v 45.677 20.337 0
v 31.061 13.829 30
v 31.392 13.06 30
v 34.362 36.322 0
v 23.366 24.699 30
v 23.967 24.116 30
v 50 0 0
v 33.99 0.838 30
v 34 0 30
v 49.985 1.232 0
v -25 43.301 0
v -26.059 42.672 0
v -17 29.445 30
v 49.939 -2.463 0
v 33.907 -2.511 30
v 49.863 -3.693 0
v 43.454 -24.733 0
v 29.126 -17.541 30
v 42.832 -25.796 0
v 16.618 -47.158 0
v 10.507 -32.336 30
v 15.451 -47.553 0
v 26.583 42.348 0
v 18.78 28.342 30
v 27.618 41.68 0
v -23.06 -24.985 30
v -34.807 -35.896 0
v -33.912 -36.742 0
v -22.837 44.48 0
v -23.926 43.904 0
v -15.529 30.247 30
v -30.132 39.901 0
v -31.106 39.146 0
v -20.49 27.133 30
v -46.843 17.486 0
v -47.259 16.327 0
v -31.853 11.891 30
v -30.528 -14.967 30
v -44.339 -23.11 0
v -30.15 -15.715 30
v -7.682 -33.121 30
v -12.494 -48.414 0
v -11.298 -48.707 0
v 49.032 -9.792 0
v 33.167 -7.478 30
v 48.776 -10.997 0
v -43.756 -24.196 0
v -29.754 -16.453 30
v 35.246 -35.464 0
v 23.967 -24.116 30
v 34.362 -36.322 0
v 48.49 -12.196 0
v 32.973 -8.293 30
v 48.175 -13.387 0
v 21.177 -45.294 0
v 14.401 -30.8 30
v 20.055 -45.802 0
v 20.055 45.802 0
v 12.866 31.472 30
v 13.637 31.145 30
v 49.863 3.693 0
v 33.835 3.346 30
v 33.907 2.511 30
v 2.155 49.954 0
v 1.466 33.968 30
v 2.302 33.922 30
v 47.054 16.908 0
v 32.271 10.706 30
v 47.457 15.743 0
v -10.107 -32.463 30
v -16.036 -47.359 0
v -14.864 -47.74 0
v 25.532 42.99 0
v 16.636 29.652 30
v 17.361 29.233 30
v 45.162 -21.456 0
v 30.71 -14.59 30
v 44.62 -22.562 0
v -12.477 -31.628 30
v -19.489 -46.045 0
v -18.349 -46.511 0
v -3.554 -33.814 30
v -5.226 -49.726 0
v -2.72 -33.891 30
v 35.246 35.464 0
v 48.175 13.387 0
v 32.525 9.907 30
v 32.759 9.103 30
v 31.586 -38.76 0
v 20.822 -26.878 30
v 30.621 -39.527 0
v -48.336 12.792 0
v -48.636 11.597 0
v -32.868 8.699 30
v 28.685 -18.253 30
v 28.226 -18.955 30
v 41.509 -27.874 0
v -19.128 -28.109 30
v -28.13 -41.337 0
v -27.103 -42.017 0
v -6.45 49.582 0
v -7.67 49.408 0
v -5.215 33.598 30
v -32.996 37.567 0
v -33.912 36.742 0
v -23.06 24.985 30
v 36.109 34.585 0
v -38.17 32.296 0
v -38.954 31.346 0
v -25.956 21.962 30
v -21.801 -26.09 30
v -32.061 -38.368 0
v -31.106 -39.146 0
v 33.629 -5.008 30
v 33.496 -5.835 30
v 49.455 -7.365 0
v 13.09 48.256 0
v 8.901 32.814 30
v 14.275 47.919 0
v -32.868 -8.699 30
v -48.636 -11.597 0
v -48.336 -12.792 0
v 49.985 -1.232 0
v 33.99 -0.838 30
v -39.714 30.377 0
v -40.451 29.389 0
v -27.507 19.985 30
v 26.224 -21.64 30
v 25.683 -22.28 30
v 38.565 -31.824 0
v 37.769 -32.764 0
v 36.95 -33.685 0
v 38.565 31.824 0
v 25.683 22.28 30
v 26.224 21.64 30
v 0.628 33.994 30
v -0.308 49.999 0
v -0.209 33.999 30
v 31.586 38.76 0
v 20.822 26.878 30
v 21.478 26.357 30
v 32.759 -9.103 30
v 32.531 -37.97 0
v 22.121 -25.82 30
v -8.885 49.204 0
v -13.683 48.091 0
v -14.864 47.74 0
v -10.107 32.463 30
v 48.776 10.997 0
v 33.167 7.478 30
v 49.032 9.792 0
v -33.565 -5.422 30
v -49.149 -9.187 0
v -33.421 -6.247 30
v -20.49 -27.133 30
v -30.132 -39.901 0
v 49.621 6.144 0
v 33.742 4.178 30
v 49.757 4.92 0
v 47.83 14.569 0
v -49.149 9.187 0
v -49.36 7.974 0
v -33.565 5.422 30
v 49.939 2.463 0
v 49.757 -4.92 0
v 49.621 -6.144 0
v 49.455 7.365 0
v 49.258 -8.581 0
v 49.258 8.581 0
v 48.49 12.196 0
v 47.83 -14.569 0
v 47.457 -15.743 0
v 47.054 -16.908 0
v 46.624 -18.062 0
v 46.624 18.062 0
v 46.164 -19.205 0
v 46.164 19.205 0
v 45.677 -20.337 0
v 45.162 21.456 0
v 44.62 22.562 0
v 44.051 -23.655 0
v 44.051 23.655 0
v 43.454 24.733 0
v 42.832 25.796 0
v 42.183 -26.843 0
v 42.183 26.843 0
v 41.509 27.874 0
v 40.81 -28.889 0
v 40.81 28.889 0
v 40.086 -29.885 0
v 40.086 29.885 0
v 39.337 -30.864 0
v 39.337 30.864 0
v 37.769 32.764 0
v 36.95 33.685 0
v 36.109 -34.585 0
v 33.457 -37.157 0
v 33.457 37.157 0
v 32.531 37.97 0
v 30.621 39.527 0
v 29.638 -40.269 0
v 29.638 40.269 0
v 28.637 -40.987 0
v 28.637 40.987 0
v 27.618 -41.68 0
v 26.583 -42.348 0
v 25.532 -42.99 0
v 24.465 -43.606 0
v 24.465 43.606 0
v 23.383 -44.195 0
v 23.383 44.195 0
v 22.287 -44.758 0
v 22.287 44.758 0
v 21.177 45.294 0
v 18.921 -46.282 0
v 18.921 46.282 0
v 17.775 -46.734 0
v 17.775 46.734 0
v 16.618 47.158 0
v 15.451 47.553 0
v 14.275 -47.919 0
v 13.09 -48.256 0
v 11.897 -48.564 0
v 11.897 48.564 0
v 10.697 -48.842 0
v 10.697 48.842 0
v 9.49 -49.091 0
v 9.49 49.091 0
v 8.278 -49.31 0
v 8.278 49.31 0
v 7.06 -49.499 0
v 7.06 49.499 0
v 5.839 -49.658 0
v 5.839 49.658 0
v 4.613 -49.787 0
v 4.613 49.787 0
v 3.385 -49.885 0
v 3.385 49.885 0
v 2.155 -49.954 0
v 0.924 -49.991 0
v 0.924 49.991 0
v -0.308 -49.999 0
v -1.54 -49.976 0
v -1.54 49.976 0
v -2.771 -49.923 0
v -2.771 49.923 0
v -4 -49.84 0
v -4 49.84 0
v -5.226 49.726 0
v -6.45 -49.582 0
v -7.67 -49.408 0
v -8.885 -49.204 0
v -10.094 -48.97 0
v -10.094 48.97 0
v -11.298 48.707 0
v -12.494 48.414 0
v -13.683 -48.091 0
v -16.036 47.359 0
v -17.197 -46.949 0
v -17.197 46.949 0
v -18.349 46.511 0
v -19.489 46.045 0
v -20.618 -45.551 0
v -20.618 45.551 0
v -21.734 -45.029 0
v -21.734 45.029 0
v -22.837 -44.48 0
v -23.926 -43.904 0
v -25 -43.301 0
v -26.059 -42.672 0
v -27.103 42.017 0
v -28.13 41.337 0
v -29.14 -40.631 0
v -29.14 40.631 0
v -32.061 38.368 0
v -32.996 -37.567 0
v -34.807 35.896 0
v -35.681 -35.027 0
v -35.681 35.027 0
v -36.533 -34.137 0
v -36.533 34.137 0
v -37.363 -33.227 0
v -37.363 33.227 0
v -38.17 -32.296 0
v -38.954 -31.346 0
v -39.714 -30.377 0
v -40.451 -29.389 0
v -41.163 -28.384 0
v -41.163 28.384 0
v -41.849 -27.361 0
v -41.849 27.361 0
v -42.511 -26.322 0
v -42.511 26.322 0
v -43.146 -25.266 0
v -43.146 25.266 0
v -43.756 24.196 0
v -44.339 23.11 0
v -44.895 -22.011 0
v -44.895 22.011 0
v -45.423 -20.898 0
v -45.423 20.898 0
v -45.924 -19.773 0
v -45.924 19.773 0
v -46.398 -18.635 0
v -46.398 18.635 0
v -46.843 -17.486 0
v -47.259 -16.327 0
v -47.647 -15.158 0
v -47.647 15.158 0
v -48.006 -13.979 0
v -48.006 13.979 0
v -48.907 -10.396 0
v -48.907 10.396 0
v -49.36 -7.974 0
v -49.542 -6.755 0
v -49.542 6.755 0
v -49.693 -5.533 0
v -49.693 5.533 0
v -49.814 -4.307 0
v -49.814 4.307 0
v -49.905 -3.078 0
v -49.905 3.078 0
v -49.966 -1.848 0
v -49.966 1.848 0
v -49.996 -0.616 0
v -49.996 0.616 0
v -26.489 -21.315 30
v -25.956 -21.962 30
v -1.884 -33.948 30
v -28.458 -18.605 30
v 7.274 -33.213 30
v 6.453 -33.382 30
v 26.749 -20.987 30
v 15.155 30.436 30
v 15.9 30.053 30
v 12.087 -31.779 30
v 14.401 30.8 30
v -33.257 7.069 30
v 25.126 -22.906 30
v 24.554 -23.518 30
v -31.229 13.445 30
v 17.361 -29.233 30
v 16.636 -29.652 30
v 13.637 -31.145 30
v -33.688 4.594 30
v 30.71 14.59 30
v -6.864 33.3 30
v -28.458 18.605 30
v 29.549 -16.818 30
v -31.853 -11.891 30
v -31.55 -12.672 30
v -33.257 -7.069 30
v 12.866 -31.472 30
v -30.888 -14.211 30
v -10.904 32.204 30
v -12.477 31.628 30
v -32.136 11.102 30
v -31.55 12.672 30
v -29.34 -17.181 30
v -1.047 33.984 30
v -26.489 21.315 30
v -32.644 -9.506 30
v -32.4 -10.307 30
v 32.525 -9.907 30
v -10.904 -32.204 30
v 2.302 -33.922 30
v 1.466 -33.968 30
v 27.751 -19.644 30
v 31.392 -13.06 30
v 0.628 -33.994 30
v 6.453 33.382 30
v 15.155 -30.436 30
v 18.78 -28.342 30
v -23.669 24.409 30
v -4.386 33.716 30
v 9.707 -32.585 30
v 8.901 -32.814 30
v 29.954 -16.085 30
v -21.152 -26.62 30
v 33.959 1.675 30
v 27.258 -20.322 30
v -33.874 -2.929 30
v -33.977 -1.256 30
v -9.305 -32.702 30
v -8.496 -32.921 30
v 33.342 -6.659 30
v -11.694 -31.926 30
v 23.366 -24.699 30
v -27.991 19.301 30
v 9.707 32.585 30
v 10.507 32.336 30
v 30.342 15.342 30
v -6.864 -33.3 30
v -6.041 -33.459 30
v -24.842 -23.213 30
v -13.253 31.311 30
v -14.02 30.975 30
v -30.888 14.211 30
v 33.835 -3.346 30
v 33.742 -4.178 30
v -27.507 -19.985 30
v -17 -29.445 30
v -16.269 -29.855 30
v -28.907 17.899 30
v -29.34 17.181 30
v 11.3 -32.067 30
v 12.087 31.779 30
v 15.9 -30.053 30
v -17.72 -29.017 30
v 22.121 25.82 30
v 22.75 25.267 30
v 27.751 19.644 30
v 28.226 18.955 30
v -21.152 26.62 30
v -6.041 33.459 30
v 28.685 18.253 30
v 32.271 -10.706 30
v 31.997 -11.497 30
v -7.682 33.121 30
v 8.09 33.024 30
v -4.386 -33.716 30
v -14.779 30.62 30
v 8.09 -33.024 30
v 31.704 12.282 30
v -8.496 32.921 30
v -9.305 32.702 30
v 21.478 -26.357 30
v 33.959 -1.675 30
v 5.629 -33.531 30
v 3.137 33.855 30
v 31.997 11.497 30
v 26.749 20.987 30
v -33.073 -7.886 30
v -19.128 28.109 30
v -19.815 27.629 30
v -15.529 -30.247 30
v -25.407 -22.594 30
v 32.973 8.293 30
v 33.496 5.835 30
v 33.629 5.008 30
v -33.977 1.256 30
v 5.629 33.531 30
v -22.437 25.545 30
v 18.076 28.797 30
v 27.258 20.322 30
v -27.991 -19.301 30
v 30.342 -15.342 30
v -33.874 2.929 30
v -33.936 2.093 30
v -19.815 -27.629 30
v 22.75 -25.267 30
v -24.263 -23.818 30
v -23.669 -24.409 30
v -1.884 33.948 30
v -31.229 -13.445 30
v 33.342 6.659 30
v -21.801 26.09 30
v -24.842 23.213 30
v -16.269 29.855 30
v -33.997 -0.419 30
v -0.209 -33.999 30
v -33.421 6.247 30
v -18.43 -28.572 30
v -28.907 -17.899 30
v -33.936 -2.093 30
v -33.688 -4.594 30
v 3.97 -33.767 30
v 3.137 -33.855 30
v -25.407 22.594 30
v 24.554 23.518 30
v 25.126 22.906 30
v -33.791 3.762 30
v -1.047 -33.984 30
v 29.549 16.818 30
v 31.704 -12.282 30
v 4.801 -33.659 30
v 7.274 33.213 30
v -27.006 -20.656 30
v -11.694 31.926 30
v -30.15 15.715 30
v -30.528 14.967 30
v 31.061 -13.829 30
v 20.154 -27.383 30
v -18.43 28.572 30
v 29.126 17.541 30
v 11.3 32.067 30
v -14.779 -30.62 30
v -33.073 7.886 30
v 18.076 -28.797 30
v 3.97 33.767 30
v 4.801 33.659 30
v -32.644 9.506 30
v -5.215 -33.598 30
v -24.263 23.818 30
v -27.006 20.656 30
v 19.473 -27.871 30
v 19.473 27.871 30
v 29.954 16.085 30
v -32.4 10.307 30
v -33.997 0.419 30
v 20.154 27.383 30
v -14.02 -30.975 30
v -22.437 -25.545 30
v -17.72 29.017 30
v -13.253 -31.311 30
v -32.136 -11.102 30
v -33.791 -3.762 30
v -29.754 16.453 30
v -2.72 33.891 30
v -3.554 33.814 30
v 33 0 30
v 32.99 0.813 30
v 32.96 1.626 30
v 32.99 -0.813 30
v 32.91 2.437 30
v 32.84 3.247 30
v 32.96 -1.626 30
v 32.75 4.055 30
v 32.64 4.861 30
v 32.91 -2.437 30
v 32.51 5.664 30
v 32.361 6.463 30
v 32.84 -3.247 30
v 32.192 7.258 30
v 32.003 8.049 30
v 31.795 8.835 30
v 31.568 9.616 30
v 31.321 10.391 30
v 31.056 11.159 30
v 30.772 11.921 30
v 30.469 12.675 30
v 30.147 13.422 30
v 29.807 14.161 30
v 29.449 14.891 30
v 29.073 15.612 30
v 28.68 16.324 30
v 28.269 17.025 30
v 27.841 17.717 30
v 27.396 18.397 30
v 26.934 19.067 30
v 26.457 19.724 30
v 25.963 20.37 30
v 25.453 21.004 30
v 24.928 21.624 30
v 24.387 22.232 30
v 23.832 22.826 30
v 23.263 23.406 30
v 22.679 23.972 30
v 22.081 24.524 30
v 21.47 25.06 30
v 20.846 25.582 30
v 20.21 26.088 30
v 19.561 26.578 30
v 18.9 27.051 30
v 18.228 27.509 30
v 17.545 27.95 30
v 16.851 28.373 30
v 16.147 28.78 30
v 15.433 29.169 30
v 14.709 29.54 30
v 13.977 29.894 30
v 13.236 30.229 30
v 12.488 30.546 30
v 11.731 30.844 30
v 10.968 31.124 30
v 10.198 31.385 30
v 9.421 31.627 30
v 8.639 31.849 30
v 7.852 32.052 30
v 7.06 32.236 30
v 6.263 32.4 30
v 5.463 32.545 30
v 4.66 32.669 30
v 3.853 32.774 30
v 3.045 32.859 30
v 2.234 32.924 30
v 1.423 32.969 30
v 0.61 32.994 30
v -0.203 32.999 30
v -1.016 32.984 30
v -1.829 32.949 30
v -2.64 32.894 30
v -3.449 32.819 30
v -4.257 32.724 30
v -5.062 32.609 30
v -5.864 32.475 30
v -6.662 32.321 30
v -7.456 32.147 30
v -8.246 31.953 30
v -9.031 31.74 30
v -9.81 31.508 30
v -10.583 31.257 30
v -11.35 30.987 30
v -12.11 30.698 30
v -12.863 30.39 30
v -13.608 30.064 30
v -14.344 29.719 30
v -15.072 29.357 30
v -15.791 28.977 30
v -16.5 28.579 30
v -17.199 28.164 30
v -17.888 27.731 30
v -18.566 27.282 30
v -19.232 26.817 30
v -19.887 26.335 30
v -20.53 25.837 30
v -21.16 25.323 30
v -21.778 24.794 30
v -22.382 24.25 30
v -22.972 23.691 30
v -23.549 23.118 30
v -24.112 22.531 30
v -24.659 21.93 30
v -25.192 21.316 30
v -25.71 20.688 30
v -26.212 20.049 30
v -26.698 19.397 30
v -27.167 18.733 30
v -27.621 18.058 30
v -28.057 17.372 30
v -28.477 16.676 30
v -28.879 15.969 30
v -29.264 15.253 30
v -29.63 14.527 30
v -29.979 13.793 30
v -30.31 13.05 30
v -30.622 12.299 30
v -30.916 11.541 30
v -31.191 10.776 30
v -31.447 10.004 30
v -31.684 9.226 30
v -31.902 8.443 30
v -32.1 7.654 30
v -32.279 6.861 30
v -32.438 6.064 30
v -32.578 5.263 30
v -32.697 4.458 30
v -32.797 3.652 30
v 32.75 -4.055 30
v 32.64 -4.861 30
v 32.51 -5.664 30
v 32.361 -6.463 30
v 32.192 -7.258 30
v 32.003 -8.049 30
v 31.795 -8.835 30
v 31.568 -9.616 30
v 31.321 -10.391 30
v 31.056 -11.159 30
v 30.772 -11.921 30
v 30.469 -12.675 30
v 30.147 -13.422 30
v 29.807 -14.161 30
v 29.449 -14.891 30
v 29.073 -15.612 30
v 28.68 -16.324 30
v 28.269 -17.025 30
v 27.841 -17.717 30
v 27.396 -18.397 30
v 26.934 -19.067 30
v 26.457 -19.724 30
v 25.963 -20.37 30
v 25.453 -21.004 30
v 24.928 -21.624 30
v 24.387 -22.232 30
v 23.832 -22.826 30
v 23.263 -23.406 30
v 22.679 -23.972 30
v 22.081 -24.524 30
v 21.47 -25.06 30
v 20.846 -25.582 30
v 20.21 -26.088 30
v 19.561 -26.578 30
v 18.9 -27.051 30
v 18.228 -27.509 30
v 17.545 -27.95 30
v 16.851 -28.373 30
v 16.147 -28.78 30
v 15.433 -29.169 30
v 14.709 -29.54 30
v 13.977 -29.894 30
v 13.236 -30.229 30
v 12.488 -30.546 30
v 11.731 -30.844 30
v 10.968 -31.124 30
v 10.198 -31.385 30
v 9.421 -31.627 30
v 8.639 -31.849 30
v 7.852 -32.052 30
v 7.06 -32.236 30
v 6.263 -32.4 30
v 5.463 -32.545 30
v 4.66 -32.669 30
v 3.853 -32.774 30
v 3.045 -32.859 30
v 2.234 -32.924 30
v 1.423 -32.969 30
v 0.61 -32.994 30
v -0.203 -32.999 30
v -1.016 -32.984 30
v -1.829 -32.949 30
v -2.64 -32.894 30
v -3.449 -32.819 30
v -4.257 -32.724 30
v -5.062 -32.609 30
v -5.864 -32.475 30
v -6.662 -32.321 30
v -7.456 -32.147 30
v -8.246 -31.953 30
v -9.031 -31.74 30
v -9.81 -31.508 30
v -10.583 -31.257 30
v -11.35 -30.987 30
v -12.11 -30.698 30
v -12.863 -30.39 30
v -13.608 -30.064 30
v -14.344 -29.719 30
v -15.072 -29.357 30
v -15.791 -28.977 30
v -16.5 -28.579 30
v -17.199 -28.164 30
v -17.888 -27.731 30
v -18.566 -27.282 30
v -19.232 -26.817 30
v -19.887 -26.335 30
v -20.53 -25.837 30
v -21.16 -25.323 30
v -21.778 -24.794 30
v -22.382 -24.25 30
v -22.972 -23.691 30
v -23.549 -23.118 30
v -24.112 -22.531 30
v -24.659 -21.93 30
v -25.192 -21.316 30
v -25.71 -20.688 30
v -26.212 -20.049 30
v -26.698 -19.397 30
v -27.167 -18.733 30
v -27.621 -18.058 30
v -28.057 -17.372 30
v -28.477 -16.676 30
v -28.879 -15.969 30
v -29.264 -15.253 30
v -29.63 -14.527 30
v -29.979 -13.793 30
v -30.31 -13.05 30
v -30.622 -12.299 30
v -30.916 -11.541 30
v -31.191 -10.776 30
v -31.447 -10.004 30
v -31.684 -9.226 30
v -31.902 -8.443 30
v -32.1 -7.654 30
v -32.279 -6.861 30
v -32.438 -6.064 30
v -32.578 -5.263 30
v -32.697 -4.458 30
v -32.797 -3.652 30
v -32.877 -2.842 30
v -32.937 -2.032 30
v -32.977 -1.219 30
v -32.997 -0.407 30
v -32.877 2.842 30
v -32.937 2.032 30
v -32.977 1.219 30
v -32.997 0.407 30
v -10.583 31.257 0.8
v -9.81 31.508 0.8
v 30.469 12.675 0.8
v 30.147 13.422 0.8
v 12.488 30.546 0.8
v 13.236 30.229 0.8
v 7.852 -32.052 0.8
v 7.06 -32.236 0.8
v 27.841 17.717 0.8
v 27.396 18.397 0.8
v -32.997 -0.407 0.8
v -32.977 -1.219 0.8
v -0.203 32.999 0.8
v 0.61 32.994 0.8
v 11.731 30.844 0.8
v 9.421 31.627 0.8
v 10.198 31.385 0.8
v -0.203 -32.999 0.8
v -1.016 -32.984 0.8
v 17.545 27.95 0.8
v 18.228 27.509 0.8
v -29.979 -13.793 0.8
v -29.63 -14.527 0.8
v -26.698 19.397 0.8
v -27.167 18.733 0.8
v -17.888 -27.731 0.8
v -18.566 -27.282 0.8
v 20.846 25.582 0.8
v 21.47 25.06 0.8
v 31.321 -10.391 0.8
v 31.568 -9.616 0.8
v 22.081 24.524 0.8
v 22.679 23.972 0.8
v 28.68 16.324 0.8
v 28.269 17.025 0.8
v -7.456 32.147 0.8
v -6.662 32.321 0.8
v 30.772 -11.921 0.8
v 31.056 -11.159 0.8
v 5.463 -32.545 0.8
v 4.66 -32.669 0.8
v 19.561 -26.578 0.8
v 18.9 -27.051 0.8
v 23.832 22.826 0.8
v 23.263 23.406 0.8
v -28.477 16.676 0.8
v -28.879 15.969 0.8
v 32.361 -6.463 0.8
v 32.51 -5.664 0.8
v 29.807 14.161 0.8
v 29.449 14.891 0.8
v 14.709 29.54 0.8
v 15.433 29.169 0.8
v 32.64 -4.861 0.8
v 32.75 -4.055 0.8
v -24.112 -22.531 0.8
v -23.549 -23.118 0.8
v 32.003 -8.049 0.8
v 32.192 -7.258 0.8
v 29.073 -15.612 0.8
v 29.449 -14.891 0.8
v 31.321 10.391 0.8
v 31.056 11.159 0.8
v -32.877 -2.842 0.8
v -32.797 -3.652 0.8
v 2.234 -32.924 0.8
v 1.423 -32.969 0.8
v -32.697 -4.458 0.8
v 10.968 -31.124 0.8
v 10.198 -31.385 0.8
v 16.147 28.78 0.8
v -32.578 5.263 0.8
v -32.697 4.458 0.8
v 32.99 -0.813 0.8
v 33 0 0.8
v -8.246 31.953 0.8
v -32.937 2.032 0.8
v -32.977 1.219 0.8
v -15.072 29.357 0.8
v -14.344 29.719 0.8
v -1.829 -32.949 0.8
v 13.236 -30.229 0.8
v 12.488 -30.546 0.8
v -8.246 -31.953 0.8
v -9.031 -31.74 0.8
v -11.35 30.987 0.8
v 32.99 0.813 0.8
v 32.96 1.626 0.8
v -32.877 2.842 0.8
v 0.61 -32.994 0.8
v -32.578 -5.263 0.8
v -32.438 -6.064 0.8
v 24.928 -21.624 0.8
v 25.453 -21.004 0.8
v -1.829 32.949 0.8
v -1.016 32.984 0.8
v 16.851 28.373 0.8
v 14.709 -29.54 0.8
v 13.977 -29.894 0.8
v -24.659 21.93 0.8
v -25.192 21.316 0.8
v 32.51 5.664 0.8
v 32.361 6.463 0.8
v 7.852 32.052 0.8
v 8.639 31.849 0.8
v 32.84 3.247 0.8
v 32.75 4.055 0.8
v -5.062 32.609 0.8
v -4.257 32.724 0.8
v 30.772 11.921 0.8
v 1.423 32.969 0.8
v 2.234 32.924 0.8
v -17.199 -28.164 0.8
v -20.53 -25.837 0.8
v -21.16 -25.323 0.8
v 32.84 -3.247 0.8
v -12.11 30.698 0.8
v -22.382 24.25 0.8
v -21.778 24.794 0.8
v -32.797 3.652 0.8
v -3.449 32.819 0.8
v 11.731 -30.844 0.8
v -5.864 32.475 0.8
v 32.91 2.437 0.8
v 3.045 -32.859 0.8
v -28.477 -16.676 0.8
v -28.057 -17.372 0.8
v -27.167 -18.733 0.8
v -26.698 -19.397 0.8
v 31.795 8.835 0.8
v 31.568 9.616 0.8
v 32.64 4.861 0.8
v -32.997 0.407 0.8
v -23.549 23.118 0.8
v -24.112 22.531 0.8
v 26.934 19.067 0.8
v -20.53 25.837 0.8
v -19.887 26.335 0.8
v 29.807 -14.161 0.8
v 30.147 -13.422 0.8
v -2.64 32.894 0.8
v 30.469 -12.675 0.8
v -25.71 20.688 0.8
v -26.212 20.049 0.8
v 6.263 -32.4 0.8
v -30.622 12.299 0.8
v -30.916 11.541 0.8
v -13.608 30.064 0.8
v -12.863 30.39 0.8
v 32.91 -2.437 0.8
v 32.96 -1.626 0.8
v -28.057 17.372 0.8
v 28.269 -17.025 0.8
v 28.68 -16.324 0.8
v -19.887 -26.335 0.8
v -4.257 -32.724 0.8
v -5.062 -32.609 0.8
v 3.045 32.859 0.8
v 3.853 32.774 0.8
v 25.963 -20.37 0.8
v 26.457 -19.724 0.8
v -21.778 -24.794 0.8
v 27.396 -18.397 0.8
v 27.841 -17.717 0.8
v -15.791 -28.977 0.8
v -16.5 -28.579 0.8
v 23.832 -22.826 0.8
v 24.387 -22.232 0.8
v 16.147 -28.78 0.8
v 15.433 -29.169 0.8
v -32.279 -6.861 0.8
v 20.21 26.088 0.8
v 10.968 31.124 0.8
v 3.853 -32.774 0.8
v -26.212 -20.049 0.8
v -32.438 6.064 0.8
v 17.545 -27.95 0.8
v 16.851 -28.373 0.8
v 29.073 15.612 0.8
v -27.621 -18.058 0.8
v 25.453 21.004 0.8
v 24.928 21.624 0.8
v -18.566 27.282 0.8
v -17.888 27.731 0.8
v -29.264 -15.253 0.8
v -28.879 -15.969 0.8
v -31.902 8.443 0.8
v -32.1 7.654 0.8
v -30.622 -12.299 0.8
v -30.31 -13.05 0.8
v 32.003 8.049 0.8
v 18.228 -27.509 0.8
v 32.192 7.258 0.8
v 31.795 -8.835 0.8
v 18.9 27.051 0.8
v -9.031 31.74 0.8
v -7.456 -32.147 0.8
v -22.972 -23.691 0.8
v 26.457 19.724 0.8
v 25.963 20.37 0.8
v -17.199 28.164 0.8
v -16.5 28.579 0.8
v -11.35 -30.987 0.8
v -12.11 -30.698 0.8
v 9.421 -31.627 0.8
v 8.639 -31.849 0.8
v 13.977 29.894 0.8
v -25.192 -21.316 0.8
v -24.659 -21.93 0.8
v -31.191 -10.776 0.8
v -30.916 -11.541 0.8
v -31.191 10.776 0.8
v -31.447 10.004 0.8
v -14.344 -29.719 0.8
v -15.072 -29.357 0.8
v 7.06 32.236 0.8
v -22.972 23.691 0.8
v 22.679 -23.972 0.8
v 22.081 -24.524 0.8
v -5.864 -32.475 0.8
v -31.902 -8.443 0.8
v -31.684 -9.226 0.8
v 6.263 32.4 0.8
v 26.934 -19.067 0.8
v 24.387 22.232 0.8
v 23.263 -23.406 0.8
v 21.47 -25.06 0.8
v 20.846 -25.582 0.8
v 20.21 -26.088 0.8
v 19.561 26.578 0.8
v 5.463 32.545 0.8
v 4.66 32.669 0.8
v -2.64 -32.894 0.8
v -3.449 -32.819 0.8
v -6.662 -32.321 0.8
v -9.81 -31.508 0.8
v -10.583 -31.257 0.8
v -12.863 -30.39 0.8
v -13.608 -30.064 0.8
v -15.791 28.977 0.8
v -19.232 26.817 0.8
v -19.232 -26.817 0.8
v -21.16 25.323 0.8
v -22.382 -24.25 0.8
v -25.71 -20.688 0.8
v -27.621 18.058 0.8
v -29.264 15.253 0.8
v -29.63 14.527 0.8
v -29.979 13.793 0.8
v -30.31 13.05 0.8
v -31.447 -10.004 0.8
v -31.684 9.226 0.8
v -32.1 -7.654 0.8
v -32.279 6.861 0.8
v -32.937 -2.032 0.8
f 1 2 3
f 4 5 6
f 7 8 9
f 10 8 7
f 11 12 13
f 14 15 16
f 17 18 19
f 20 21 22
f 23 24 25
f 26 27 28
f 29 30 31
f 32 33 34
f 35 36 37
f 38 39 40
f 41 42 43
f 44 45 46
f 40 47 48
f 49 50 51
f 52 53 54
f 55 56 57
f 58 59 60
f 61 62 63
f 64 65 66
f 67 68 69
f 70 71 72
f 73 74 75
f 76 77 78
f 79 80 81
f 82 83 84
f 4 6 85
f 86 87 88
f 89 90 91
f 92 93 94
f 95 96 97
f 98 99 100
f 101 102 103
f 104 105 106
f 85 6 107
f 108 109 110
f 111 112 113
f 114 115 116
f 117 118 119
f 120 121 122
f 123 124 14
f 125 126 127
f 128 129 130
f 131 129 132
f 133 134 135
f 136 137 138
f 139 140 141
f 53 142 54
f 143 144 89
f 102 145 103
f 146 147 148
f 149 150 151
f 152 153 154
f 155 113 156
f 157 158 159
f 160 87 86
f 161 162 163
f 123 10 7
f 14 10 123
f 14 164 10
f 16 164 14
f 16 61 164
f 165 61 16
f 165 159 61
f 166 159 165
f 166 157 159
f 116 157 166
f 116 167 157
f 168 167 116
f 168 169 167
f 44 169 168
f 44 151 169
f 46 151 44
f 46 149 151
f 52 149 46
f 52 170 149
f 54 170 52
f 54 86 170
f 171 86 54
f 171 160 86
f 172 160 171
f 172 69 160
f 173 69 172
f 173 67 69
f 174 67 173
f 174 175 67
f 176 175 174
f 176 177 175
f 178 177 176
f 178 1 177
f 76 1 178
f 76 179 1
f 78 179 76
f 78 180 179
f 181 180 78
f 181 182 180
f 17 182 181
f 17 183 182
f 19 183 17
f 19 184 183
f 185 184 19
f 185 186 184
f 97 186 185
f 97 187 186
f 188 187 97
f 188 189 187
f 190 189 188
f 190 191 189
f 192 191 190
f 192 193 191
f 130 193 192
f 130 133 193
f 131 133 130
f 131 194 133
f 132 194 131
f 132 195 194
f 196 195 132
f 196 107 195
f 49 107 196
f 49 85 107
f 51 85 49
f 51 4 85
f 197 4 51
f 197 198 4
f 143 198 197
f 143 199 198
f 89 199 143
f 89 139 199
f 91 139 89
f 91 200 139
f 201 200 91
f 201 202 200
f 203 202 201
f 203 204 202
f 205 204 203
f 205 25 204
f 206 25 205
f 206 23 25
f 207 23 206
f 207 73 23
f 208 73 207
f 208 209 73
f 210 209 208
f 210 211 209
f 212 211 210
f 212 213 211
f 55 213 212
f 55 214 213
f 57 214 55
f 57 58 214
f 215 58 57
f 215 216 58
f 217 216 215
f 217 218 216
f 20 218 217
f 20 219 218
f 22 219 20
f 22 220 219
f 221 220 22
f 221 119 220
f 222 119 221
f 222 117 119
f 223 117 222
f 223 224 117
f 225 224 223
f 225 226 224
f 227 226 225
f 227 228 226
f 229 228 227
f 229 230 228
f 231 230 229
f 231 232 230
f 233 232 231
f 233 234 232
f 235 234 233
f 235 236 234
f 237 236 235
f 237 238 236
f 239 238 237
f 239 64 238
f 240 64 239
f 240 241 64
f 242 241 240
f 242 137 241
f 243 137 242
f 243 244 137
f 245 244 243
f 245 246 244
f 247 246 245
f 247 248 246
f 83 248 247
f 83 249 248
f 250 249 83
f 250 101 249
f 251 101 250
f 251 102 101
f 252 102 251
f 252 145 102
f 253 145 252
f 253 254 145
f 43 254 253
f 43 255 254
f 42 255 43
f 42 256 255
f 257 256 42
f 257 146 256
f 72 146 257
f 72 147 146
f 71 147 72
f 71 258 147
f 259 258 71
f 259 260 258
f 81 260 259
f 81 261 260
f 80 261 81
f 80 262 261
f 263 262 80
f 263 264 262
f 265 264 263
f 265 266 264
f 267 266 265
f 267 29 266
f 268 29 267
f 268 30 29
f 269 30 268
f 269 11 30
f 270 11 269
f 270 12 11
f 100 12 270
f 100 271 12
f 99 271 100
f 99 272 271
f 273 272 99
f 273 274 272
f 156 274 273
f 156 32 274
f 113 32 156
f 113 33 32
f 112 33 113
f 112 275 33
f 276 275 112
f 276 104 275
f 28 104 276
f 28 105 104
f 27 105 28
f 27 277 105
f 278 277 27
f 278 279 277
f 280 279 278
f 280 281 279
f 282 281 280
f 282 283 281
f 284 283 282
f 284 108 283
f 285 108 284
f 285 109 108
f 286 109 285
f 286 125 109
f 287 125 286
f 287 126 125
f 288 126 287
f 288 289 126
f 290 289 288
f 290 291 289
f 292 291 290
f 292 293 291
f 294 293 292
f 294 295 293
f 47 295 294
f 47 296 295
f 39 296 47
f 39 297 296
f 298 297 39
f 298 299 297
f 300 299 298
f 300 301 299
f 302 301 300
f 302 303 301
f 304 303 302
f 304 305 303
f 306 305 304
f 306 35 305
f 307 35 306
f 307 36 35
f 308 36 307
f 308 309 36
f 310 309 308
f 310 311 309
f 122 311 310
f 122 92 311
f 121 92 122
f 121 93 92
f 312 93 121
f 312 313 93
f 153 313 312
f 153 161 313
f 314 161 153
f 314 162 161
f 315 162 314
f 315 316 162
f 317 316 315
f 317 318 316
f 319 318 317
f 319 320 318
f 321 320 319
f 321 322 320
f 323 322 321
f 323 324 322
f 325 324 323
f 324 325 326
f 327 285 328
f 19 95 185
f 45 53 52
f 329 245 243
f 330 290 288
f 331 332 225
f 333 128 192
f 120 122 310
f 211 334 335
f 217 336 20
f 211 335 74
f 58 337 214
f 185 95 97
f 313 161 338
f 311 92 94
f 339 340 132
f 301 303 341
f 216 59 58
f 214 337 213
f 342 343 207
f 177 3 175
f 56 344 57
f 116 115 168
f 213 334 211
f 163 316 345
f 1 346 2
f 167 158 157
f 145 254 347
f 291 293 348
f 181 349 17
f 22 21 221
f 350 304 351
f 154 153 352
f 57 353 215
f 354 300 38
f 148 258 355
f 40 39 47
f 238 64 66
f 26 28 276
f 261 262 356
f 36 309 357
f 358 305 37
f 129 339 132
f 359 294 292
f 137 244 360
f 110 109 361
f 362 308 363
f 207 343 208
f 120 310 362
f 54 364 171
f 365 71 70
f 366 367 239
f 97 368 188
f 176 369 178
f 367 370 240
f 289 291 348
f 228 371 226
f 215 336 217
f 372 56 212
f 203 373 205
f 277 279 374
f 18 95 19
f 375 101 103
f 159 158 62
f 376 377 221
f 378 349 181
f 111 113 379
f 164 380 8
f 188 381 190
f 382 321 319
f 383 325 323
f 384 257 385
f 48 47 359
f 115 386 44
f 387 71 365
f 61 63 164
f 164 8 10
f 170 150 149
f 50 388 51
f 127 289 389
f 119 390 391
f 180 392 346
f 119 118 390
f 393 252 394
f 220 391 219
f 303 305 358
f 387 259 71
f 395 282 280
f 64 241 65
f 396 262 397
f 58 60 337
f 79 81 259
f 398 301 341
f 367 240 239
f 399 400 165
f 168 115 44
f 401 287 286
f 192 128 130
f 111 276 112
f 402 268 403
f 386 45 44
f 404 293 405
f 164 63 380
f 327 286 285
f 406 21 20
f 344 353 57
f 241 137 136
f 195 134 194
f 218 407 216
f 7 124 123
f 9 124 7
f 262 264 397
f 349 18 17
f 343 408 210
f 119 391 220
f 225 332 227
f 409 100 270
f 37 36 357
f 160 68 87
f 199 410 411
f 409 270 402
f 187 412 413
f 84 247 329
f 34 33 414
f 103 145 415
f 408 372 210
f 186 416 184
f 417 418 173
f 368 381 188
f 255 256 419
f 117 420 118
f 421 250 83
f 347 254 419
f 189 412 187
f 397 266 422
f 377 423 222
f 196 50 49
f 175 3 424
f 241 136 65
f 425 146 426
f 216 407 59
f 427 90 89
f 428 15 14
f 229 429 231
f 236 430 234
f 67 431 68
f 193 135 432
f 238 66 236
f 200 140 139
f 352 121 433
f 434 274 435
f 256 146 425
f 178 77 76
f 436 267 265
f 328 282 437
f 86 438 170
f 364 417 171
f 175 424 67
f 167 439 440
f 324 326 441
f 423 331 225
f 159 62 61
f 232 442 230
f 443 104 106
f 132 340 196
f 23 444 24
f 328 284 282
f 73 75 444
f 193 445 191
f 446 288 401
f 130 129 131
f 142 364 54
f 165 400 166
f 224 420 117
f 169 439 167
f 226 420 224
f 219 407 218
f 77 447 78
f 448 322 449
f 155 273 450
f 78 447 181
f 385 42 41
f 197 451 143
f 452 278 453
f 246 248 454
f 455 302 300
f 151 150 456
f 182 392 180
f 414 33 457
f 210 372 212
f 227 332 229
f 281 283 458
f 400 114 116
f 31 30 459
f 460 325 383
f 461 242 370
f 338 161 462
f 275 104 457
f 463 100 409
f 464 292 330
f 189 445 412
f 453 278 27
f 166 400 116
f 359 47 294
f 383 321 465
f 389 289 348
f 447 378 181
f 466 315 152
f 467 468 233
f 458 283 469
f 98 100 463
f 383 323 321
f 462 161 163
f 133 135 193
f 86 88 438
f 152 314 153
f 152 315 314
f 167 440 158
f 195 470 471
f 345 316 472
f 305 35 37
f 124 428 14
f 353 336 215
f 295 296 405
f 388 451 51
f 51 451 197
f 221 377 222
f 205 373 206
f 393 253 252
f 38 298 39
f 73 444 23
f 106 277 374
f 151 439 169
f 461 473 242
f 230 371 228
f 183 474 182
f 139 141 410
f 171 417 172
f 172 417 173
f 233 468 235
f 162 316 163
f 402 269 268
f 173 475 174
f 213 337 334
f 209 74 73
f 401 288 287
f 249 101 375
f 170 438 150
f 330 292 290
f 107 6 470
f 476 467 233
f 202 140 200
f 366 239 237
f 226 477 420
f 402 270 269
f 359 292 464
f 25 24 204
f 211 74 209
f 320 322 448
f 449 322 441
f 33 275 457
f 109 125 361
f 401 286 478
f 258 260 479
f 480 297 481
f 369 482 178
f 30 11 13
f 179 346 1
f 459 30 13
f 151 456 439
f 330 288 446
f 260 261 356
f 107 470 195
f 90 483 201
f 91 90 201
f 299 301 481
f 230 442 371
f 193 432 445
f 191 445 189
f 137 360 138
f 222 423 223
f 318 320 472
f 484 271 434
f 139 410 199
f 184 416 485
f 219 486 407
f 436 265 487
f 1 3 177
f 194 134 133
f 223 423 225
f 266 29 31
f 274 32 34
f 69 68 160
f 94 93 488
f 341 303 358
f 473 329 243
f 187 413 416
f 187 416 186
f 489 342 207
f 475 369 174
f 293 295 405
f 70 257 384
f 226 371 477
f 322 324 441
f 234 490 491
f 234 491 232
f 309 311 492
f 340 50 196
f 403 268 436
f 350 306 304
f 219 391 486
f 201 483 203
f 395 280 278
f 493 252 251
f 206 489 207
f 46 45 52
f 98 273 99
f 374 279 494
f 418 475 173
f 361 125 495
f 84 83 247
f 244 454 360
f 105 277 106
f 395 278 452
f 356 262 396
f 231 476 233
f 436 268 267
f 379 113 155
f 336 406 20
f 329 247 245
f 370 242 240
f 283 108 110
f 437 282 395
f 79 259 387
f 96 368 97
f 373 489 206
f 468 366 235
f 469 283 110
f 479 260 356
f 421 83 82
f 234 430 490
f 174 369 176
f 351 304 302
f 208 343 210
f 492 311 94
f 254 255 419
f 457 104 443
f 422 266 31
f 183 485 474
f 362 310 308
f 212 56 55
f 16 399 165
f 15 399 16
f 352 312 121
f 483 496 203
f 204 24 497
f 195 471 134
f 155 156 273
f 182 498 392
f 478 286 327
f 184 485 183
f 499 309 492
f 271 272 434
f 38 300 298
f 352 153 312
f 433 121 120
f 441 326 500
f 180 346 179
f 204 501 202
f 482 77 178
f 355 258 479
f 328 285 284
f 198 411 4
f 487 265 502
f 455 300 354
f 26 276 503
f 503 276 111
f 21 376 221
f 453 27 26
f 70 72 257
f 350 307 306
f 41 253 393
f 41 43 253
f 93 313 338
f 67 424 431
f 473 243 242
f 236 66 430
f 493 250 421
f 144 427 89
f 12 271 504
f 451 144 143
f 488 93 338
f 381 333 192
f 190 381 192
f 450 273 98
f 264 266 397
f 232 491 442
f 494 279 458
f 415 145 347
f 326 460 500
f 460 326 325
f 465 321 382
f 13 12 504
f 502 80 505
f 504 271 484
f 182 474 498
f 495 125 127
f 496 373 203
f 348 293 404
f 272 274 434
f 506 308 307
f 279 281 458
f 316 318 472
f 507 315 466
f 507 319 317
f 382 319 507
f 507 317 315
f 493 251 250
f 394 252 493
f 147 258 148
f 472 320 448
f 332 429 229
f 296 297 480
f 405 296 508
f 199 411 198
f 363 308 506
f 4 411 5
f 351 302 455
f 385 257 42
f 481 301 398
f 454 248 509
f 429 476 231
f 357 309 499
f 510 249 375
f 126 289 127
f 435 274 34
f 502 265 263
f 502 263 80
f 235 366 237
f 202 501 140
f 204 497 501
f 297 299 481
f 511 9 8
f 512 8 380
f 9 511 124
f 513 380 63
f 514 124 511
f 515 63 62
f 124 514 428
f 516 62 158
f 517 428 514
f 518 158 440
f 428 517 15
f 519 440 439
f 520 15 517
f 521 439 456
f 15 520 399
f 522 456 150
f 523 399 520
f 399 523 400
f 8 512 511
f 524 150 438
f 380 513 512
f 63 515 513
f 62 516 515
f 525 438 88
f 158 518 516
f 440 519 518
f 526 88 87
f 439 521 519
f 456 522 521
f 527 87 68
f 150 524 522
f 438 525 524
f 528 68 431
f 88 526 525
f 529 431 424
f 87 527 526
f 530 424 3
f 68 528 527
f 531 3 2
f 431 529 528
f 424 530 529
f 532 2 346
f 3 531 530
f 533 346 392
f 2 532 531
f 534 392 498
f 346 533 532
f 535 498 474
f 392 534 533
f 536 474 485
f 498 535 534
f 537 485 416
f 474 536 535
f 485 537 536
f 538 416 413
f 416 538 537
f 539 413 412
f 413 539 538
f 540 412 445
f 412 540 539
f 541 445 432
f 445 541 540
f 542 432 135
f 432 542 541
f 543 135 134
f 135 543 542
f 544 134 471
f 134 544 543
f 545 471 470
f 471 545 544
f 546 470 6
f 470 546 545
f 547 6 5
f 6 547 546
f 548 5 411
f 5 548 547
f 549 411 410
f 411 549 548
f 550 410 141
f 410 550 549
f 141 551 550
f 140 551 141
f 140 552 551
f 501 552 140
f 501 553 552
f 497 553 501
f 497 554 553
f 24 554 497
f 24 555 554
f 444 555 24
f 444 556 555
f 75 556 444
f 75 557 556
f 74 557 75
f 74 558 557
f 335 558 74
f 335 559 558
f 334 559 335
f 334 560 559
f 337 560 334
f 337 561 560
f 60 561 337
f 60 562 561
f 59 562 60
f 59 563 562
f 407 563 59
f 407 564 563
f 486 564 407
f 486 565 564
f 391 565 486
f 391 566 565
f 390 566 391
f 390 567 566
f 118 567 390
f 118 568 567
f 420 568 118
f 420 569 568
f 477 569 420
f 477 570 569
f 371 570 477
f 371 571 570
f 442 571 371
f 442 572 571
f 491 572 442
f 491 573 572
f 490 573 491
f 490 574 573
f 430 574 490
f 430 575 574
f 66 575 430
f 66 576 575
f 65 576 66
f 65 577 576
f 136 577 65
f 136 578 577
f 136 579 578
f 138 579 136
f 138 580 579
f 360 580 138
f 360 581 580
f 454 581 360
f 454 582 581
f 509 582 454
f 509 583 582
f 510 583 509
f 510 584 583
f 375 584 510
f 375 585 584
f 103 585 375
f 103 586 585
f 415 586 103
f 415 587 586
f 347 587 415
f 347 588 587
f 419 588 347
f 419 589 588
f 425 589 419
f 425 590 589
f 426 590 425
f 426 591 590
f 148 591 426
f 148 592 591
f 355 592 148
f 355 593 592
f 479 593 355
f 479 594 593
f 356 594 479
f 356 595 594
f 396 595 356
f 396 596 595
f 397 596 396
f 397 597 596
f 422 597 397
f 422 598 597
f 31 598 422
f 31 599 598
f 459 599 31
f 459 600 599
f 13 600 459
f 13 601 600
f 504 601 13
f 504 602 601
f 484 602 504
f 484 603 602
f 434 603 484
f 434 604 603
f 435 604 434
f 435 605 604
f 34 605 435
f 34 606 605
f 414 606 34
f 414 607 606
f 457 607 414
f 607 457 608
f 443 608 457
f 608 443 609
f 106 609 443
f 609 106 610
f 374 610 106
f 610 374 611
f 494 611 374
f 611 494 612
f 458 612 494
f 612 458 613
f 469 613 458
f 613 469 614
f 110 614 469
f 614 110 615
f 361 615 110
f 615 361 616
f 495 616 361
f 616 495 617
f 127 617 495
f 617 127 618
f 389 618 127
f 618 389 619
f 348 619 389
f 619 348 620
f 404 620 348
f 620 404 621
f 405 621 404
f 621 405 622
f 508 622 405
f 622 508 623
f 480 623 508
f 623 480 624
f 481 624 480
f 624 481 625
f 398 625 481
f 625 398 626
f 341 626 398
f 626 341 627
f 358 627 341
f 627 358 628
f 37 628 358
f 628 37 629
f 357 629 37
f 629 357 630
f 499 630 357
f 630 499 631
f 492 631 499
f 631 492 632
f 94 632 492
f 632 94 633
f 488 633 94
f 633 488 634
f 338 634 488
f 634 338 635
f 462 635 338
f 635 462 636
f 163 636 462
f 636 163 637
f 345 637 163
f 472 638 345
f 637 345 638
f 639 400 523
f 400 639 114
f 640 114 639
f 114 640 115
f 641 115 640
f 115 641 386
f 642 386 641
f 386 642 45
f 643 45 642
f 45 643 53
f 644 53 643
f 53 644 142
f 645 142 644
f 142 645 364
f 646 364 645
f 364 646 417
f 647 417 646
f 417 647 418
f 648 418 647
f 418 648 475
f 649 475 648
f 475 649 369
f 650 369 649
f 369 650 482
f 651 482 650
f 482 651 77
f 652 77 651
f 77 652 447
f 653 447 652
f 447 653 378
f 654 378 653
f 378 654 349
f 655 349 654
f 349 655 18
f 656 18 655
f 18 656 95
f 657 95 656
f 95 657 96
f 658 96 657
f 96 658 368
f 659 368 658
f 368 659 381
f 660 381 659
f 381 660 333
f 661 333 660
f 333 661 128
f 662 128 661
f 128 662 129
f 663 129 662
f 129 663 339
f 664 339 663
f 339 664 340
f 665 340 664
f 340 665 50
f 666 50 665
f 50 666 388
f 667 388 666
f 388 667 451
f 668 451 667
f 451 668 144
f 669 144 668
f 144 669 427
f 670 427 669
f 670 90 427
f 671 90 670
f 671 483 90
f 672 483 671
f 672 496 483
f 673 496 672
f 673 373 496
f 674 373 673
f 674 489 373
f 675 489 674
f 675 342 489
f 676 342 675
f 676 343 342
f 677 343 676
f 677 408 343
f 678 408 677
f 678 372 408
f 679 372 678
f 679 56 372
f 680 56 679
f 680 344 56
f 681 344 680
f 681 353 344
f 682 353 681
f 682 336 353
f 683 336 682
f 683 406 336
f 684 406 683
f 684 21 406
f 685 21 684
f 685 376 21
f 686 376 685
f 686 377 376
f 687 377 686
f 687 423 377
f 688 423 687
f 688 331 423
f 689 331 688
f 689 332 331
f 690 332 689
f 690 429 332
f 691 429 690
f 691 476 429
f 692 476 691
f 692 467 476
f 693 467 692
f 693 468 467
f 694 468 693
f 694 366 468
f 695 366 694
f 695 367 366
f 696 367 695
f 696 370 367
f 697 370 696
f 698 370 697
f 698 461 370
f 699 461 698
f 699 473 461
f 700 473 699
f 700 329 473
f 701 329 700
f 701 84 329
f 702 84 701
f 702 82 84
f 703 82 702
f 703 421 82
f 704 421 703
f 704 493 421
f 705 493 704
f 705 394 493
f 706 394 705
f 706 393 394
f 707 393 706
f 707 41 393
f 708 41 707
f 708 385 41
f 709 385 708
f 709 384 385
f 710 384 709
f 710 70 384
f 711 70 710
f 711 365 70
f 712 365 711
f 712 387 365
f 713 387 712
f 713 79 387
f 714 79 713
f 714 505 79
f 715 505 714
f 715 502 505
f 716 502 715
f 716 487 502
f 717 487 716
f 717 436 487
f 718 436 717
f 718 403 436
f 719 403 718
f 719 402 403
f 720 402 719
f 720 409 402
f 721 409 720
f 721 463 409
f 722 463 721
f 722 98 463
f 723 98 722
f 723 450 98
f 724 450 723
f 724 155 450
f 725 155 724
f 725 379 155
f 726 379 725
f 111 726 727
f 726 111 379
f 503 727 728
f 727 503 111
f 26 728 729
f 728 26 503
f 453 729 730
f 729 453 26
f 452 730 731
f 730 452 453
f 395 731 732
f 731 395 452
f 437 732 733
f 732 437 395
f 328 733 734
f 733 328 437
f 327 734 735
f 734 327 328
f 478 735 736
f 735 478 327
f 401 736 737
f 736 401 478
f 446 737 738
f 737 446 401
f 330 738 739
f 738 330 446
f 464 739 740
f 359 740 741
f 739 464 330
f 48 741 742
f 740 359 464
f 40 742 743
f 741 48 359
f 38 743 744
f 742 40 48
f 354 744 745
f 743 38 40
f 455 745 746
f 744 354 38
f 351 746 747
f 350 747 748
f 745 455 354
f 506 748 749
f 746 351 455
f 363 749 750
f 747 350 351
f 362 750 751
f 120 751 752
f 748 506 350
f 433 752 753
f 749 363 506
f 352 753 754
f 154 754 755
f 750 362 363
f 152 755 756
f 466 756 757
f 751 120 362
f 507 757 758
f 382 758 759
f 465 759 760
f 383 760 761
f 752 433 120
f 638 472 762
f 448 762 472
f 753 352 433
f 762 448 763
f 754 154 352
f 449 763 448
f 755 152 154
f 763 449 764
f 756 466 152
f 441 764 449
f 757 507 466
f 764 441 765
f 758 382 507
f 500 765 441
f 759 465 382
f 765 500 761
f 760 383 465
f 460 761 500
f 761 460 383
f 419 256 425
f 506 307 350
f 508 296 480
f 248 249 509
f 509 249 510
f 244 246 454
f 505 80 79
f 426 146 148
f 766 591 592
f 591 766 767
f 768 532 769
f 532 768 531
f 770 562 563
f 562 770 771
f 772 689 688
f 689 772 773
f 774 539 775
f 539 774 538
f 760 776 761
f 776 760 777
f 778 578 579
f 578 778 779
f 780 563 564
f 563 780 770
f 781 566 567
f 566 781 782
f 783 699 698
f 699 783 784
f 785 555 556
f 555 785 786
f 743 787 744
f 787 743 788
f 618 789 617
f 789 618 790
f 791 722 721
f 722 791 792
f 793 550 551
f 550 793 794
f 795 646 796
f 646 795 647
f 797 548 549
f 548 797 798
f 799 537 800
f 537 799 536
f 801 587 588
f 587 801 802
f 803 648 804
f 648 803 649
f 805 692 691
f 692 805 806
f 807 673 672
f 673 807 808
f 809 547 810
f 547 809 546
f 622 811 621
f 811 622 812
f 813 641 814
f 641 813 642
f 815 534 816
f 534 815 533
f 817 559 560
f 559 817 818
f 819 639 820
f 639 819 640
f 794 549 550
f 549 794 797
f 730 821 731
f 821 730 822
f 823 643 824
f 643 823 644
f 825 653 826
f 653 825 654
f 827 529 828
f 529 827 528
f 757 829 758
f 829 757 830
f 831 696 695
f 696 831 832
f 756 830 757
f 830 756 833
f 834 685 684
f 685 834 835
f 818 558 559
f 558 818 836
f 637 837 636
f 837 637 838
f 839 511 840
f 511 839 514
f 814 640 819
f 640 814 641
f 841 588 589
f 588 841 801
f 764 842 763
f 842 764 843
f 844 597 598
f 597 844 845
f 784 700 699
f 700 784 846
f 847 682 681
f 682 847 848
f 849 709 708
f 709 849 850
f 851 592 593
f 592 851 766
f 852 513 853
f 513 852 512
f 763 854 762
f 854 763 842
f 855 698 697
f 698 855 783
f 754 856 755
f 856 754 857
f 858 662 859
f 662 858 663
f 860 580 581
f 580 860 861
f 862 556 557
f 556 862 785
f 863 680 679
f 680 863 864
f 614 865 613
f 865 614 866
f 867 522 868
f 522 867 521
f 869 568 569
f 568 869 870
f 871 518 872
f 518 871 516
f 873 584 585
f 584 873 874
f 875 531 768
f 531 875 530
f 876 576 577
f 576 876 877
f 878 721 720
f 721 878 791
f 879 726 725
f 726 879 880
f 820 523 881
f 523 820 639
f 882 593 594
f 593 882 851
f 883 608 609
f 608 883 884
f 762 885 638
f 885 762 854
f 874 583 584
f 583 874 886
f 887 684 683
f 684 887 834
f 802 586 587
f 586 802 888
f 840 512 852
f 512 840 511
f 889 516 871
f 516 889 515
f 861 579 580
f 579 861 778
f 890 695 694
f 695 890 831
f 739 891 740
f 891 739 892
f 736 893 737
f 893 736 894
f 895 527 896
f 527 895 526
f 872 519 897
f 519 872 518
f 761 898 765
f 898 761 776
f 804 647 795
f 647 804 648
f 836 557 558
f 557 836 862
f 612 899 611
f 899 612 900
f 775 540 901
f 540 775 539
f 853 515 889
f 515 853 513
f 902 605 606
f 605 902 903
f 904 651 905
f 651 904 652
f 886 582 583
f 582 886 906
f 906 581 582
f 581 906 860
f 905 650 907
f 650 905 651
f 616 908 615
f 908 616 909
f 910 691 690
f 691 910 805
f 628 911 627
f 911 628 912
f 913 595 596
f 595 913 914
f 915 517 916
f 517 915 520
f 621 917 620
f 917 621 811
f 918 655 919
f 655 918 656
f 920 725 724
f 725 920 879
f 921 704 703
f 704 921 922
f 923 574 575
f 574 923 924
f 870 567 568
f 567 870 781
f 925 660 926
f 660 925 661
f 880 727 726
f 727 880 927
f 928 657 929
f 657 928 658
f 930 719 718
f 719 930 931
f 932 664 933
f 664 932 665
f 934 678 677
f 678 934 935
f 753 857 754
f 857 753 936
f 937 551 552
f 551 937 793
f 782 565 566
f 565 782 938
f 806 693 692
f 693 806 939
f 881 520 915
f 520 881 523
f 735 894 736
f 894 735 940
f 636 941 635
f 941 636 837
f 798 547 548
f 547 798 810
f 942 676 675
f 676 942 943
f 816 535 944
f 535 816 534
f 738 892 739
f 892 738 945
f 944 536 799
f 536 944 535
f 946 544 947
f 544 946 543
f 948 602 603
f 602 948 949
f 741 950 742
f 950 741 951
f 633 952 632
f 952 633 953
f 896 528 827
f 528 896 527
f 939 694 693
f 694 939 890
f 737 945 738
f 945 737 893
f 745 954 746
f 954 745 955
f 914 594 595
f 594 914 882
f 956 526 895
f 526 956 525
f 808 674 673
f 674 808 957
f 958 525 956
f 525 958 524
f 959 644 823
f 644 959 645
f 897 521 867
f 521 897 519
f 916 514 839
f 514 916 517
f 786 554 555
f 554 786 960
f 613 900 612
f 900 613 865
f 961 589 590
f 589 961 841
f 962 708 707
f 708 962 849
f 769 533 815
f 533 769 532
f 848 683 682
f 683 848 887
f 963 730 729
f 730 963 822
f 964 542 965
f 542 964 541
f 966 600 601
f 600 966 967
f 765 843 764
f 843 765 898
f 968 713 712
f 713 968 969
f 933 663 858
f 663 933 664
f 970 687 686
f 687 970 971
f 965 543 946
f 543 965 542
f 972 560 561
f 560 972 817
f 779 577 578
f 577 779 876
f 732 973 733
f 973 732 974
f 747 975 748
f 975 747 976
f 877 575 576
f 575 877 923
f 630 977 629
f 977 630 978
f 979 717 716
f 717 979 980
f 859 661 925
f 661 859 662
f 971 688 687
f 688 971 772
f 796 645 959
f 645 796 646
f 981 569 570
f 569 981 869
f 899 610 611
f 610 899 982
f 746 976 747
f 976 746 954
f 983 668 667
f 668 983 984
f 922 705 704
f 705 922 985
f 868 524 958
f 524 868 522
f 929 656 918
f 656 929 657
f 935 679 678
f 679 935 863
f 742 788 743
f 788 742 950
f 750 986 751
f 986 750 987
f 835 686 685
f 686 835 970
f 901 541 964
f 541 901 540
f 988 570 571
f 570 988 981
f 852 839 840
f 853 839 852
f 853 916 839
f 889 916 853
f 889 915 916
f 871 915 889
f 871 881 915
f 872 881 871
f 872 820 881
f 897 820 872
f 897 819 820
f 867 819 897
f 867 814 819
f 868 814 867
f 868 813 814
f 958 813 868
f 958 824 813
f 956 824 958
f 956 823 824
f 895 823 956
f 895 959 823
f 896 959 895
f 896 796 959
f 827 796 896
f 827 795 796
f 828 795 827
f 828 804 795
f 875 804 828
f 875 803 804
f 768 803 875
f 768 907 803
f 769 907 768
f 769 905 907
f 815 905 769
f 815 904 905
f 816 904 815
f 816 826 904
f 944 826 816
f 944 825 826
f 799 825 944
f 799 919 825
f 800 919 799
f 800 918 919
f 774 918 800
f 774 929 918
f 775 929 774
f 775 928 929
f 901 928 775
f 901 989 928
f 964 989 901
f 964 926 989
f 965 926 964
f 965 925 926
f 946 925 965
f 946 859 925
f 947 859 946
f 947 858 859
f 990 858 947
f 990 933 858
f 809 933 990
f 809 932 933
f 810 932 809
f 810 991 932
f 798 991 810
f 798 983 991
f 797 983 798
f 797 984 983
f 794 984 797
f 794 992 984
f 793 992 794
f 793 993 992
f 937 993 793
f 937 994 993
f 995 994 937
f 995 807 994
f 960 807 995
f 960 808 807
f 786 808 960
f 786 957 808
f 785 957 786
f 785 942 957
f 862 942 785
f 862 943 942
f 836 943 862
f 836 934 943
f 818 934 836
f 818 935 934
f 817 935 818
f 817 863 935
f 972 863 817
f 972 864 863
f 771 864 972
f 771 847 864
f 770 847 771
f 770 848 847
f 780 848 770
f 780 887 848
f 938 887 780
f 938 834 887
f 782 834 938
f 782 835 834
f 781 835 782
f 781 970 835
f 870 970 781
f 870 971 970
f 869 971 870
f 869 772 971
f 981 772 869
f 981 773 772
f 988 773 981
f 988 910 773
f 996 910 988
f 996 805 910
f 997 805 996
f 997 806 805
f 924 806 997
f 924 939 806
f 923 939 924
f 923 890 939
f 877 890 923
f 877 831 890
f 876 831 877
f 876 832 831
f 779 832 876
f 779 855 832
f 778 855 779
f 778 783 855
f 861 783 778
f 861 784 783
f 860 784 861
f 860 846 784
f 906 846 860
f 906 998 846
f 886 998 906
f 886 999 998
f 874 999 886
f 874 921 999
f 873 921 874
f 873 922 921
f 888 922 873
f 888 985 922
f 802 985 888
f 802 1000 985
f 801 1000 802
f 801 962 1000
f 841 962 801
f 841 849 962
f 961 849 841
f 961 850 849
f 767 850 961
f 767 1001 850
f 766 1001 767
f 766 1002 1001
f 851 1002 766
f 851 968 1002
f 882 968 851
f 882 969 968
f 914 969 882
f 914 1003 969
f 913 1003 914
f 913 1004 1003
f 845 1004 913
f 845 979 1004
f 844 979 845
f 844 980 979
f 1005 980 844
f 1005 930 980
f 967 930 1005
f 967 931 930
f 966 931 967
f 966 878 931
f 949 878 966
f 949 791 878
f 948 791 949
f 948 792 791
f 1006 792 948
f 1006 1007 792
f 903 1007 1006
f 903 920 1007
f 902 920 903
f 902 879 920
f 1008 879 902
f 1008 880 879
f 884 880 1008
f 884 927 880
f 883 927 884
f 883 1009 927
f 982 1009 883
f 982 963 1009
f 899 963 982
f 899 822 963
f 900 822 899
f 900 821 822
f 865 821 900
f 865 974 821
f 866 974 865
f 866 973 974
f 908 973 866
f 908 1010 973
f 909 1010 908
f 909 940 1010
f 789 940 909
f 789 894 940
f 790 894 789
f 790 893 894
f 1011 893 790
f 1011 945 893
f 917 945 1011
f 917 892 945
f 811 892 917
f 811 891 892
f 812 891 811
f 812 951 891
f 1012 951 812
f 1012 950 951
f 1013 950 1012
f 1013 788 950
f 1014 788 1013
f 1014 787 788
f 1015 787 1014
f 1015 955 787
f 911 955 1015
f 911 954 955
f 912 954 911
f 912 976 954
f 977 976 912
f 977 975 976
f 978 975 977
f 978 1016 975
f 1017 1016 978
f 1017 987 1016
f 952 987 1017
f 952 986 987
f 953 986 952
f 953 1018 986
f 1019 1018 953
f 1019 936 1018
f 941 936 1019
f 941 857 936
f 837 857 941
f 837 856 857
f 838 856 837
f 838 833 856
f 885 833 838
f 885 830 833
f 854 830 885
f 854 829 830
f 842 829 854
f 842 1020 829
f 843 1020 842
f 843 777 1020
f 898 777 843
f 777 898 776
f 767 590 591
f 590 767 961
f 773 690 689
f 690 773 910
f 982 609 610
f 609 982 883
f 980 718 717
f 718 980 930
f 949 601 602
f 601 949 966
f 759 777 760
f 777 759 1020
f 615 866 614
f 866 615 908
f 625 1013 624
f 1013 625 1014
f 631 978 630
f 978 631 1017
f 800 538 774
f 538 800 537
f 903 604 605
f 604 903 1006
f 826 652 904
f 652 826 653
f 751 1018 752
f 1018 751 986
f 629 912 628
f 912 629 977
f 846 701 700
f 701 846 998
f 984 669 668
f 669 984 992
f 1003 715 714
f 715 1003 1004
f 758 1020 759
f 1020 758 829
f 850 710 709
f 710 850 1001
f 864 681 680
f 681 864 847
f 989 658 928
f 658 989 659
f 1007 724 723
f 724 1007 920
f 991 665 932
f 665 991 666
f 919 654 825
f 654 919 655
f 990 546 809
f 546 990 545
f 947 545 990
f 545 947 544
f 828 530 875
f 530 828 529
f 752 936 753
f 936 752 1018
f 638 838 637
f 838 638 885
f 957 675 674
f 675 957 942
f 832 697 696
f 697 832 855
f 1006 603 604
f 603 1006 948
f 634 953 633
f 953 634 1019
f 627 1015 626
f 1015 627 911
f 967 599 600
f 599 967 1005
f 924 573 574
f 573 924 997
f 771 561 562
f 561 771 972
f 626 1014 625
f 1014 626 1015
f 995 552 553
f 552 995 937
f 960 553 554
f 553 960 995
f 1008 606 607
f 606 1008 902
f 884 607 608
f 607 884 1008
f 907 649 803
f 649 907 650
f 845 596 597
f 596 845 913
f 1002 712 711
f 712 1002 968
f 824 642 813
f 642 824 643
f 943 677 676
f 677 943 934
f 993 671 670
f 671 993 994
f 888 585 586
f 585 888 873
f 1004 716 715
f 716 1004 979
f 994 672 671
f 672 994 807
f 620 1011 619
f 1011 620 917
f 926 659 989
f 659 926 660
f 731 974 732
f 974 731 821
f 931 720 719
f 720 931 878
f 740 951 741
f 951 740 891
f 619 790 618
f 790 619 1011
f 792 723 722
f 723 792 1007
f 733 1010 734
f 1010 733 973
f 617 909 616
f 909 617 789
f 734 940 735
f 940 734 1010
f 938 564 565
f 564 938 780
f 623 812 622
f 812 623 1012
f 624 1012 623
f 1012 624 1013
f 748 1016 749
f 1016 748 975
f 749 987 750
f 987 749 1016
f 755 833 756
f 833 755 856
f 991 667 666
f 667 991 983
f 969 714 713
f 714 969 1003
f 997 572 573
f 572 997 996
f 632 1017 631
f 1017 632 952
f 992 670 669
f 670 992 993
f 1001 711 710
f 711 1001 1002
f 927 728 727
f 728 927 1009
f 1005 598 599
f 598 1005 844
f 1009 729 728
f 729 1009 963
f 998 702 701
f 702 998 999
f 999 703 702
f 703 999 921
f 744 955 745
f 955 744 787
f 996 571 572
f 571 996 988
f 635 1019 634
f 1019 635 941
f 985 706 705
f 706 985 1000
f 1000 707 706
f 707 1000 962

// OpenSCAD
$fn=255;

difference() {
    cylinder(d2=68, d1=100, h=30);
    translate([0,0,0.8])
        cylinder(d=66, h=50);
}
